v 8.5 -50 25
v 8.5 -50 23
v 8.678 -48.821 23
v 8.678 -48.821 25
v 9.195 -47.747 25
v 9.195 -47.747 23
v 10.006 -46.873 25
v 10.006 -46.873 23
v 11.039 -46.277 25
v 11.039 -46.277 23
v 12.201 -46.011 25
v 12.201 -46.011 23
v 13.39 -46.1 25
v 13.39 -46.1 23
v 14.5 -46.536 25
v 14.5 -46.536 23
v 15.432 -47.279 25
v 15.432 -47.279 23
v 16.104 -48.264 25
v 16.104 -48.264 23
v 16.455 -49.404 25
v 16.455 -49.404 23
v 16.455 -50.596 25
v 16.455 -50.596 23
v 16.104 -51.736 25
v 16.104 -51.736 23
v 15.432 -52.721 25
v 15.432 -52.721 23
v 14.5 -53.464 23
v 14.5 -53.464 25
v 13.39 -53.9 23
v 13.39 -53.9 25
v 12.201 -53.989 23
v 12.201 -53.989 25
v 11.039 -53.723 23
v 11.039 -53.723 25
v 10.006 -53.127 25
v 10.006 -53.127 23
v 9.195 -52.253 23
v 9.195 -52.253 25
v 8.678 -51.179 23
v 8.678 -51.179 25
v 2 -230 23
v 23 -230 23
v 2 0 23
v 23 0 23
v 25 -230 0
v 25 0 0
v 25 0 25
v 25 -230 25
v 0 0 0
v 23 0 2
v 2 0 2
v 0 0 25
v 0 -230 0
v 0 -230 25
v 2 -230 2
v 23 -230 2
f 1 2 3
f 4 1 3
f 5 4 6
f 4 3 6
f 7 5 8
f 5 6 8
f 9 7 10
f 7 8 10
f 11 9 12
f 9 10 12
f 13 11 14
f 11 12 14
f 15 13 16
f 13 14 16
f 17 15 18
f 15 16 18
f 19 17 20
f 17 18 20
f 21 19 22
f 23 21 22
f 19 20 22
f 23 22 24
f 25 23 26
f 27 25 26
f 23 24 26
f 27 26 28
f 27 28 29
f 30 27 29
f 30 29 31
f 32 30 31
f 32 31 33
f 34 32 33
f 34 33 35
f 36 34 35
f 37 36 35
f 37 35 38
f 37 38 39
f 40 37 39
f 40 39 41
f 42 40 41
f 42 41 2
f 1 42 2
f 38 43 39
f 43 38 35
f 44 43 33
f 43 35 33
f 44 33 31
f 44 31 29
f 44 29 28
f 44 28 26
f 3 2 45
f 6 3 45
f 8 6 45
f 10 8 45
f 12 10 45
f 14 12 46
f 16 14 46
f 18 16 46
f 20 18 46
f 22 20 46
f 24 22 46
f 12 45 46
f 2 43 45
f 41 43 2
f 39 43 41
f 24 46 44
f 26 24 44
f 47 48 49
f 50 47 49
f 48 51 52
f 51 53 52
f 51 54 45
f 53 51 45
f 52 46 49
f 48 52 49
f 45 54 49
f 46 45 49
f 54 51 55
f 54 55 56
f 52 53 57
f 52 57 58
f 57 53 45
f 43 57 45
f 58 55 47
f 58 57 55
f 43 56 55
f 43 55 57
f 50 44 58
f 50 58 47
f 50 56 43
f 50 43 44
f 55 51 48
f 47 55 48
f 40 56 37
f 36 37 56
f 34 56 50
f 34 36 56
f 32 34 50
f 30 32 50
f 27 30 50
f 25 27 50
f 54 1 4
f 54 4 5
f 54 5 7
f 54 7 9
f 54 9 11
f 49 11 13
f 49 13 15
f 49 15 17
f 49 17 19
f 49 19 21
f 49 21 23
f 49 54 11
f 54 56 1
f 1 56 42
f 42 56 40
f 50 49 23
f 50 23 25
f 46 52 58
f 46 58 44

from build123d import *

# Parameters (mm, degrees)
F0_W     = 25
F0_H     = 25
F0_W_2   = 21
F0_H_2   = 21
F1_DEPTH = 230
F3_D     = 8
F3_DEPTH = 5


with BuildPart() as f1:
    # F0 (on Front) → F1 (new body)
    with BuildSketch(Plane.XZ):
        with Locations((12.5, 12.5)):
            Rectangle(F0_W, F0_H)
        with Locations((12.5, 12.5)):
            Rectangle(F0_W_2, F0_H_2, mode=Mode.SUBTRACT)
    extrude(amount=F1_DEPTH)

    # F3
    with Locations(Plane.XY.offset(25)):
        with Locations((12.5, -50)):
            Hole(F3_D / 2, depth=F3_DEPTH)


solid = f1.part
